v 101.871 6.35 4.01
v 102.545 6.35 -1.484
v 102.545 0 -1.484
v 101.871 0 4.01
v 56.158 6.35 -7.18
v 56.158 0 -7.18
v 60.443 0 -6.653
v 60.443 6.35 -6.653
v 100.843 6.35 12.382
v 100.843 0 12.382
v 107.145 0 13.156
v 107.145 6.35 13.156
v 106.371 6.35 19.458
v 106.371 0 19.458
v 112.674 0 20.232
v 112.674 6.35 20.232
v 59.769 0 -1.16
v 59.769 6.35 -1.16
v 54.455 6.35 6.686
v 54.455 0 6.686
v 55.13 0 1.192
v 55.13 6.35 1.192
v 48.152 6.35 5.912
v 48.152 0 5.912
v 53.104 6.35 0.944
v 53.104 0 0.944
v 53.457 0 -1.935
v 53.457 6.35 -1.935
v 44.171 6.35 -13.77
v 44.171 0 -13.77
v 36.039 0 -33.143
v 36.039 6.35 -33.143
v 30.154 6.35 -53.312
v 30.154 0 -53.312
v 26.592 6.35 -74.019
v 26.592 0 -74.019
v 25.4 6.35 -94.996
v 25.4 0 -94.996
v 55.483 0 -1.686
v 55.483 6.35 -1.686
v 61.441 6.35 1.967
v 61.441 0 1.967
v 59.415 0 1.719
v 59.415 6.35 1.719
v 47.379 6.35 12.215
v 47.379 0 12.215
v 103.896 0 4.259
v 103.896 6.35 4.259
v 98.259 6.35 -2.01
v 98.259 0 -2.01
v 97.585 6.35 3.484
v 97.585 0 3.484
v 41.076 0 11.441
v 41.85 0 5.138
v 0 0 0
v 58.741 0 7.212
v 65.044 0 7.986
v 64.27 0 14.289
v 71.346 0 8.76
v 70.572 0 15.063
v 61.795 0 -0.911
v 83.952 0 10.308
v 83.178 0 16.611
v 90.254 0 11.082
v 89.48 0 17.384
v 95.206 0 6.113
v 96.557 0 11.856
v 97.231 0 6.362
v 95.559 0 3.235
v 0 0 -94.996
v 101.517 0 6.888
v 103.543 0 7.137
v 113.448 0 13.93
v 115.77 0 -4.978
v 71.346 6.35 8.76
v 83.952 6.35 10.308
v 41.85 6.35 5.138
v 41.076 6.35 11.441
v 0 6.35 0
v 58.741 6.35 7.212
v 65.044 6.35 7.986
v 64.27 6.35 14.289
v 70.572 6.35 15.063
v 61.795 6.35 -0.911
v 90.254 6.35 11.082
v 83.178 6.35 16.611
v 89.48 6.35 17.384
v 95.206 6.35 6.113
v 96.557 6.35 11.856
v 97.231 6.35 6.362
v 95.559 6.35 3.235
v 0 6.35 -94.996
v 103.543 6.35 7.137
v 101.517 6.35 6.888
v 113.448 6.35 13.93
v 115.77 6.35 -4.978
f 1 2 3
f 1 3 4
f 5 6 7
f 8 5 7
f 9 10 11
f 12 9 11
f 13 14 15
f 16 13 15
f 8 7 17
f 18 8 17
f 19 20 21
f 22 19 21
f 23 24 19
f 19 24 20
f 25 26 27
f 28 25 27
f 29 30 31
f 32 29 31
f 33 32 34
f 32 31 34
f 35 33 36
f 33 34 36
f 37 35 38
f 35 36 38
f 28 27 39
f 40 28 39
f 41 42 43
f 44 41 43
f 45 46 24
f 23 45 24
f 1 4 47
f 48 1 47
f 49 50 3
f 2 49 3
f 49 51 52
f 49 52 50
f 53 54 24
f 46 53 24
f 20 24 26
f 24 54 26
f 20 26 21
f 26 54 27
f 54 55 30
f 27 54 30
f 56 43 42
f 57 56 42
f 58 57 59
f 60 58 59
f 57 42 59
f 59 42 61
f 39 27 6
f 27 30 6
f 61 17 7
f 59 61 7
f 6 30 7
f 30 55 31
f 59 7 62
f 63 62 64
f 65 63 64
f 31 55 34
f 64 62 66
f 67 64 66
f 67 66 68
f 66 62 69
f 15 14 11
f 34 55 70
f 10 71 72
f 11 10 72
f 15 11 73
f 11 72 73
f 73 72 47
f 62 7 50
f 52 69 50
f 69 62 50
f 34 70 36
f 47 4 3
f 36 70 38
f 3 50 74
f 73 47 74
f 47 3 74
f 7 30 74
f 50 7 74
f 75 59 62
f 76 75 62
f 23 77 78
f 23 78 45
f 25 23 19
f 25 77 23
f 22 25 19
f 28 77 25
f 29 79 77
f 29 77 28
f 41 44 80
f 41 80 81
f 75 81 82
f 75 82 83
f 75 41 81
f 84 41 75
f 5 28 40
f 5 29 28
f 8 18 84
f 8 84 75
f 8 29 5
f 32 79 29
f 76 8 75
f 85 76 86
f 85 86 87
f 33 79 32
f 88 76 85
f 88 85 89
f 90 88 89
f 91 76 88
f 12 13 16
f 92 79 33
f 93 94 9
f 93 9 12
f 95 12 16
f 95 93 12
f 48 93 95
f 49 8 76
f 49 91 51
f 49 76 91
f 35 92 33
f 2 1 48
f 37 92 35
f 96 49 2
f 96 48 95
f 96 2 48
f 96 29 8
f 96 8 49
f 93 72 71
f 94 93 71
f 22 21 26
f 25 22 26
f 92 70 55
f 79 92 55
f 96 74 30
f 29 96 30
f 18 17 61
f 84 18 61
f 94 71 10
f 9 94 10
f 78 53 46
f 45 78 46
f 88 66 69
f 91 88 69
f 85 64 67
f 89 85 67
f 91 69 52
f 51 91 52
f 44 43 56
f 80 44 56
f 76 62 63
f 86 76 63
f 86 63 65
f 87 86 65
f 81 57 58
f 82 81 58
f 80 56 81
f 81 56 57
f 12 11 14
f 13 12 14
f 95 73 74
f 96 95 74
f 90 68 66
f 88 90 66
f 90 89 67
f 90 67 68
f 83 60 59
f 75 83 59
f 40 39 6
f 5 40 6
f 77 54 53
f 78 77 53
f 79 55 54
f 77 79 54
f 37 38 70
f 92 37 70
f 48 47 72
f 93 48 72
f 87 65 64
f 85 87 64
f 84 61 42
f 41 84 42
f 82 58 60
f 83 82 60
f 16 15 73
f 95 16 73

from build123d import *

# Parameters (mm, degrees)
BOSS_EXTRUDE1_DEPTH = 6.35


with BuildPart() as part:
    # Sketch1 → Boss-Extrude1 (new body)
    with BuildSketch(Plane(origin=(0, 0, 0), x_dir=(1, 0, 0), z_dir=(0, 1, 0))):
        with BuildLine():
            Line((71.346202472, -8.760212143), (83.951538598, -10.307952804))
            Line((83.951538598, -10.307952804), (83.177668268, -16.610620867))
            Line((83.177668268, -16.610620867), (89.48033633, -17.384491197))
            Line((89.48033633, -17.384491197), (90.254206661, -11.081823135))
            Line((90.254206661, -11.081823135), (96.556874724, -11.855693465))
            Line((96.556874724, -11.855693465), (97.231421537, -6.361950537))
            Line((97.231421537, -6.361950537), (95.20563486, -6.113215209))
            Line((95.20563486, -6.113215209), (95.559055961, -3.234831328))
            Line((95.559055961, -3.234831328), (97.584842638, -3.483566655))
            Line((97.584842638, -3.483566655), (98.259389451, 2.010176273))
            Line((98.259389451, 2.010176273), (102.545203734, 1.483944448))
            Line((102.545203734, 1.483944448), (101.870656921, -4.00979848))
            Line((101.870656921, -4.00979848), (103.896443599, -4.258533808))
            Line((103.896443599, -4.258533808), (103.543022498, -7.136917689))
            Line((103.543022498, -7.136917689), (101.51723582, -6.888182361))
            Line((101.51723582, -6.888182361), (100.842689007, -12.38192529))
            Line((100.842689007, -12.38192529), (107.14535707, -13.155795621))
            Line((107.14535707, -13.155795621), (106.371486739, -19.458463684))
            Line((106.371486739, -19.458463684), (112.674154802, -20.232334014))
            Line((112.674154802, -20.232334014), (113.448025133, -13.929665951))
            Line((113.448025133, -13.929665951), (115.769636124, 4.978338238))
            Line((115.769636124, 4.978338238), (44.17132693, 13.769505193))
            ThreePointArc((44.17132693, 13.769505193), (30.153869414, 53.312351607), (25.4, 94.996))
            Line((25.4, 94.996), (0, 94.996))
            Line((0, 94.996), (0, 0))
            Line((0, 0), (41.849715938, -5.138498995))
            Line((41.849715938, -5.138498995), (41.075845607, -11.441167058))
            Line((41.075845607, -11.441167058), (47.37851367, -12.215037389))
            Line((47.37851367, -12.215037389), (48.152384001, -5.912369326))
            Line((48.152384001, -5.912369326), (54.455052064, -6.686239657))
            Line((54.455052064, -6.686239657), (55.129598877, -1.192496728))
            Line((55.129598877, -1.192496728), (53.103812199, -0.9437614))
            Line((53.103812199, -0.9437614), (53.4572333, 1.934622481))
            Line((53.4572333, 1.934622481), (55.483019978, 1.685887153))
            Line((55.483019978, 1.685887153), (56.157566791, 7.179630082))
            Line((56.157566791, 7.179630082), (60.443381074, 6.653398257))
            Line((60.443381074, 6.653398257), (59.768834261, 1.159655329))
            Line((59.768834261, 1.159655329), (61.794620938, 0.910920001))
            Line((61.794620938, 0.910920001), (61.441199837, -1.967463881))
            Line((61.441199837, -1.967463881), (59.41541316, -1.718728553))
            Line((59.41541316, -1.718728553), (58.740866346, -7.212471481))
            Line((58.740866346, -7.212471481), (65.043534409, -7.986341812))
            Line((65.043534409, -7.986341812), (64.269664079, -14.289009875))
            Line((64.269664079, -14.289009875), (70.572332142, -15.062880206))
            Line((70.572332142, -15.062880206), (71.346202472, -8.760212143))
        make_face()
    extrude(amount=BOSS_EXTRUDE1_DEPTH)


solid = part.part
